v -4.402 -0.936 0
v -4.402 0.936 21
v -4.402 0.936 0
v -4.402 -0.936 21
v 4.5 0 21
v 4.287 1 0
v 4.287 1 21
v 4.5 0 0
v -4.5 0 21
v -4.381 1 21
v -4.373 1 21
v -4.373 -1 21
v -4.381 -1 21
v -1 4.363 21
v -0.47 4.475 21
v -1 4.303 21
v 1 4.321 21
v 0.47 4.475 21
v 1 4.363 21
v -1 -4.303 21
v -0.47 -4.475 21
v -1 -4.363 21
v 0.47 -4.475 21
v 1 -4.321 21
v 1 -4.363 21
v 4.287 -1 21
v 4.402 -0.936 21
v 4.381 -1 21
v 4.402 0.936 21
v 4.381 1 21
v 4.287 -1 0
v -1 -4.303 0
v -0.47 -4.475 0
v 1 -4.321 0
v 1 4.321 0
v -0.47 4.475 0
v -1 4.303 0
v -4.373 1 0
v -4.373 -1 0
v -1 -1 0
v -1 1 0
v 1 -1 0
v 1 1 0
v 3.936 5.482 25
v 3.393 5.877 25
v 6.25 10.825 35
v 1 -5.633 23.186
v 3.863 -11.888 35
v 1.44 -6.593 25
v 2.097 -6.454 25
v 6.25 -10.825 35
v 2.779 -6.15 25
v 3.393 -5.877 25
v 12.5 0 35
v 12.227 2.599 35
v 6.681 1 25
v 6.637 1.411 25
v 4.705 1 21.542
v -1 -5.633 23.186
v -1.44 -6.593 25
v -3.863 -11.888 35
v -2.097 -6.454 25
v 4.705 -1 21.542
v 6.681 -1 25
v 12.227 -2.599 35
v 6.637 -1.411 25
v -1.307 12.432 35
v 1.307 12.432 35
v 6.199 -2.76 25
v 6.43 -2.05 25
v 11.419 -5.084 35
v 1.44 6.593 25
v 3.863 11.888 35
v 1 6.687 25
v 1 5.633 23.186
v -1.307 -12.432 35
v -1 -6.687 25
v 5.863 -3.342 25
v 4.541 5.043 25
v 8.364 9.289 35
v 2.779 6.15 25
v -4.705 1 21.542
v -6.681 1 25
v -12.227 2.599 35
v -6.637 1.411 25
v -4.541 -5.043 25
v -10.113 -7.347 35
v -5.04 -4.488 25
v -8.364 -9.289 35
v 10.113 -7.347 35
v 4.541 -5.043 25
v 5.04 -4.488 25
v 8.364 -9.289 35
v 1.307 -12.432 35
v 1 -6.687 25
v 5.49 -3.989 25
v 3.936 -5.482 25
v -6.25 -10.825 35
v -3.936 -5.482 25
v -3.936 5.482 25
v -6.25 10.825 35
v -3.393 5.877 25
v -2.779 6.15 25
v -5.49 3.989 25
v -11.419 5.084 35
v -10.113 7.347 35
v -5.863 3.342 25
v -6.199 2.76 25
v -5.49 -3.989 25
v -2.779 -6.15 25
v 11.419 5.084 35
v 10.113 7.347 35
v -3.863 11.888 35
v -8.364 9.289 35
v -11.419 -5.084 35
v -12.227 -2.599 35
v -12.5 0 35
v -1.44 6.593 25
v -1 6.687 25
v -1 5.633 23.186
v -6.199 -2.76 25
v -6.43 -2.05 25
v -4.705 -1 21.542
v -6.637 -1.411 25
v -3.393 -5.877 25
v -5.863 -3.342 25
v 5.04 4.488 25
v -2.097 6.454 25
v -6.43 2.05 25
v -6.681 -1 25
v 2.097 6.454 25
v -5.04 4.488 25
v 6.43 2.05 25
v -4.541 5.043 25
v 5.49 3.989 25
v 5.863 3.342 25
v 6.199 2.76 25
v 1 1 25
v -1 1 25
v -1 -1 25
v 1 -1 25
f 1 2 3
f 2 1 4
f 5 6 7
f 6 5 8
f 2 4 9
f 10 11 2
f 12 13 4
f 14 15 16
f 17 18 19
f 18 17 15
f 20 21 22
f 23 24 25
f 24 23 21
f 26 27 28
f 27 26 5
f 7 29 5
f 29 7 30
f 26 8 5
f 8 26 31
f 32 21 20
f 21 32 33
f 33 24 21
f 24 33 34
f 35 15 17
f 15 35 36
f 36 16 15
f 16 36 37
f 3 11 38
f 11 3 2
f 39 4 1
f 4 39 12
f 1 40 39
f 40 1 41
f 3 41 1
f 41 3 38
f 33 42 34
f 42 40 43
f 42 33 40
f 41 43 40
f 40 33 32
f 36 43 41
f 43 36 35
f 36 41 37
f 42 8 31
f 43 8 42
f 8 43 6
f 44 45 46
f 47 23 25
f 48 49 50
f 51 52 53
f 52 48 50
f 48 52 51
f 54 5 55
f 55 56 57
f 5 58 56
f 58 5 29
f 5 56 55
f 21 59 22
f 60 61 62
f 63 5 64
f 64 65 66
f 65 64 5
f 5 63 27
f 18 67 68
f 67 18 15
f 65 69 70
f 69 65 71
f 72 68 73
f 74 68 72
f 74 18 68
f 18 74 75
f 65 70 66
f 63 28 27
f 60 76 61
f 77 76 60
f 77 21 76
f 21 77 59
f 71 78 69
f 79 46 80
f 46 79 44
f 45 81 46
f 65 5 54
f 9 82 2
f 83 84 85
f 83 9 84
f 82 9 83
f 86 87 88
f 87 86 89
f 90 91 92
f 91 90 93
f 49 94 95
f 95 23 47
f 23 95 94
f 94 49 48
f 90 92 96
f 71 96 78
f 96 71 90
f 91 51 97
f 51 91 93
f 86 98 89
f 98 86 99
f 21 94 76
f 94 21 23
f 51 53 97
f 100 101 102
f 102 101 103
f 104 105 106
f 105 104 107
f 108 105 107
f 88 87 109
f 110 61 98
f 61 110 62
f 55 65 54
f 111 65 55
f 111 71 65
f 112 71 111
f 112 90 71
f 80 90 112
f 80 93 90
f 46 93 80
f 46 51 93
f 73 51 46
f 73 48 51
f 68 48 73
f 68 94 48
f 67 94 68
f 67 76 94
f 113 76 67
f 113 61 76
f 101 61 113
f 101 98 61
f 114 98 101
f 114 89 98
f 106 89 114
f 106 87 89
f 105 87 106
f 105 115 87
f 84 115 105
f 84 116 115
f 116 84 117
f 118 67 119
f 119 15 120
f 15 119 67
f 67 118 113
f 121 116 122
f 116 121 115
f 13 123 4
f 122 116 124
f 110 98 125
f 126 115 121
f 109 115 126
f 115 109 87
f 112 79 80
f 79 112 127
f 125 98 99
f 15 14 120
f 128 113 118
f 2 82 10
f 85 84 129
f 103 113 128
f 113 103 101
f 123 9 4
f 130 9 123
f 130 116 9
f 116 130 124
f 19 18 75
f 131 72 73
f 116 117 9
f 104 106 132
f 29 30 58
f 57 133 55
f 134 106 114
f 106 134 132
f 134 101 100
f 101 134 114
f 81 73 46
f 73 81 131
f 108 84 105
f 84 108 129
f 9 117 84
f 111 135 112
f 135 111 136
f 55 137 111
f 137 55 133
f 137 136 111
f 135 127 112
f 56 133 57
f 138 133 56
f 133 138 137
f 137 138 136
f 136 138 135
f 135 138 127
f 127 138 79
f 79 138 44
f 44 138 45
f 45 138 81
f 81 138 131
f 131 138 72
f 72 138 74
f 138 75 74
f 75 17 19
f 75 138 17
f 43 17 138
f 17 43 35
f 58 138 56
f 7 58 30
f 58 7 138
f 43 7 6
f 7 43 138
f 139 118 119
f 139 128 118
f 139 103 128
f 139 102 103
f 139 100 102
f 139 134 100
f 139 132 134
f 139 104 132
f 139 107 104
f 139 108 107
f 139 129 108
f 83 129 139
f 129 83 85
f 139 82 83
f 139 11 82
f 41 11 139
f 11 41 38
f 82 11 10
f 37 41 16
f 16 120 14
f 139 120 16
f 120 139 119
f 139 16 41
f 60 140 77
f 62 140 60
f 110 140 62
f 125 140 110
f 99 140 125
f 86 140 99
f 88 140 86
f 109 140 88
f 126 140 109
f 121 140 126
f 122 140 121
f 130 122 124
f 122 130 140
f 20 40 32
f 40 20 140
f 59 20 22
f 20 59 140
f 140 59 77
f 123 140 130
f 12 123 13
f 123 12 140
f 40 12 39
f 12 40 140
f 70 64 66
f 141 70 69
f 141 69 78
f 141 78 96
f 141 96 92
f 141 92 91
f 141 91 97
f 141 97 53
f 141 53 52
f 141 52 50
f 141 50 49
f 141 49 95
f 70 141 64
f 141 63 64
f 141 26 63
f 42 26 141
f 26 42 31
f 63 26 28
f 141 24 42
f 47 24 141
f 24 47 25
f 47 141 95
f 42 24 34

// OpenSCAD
HoleR=5;
R=16.5;
HeadR=(R-HoleR)/2;
PipeR=HeadR+HoleR;
TotalLength=100;
ConnectLength=18;
RampLength=14;
TubeLength=TotalLength-14;
Thickness=3;
InnerR = R-Thickness;
Drop=8;
IOR=R-Drop-Thickness/2;
FN=15;

module BottomPipe() {
	linear_extrude(0.1) difference() {
		intersection() {
			square([R,R]);
			circle(R);
			polygon([[0,0], [R,0],
				[cos(30)*(R+2),sin(30)*(R+2)]]);
		}
		circle(InnerR);
	}
}

module oneSidePipe() {
		assign(Rm = R-0.5)
		hull() {
			translate([PipeR, 0, TubeLength]) sphere(HeadR, center=true, $fn=FN);
			BottomPipe();
		}
}

module Pipe() {
	oneSidePipe();
	mirror([1,-1,0]) oneSidePipe();
}

module HeadSupport() {
	rotate_extrude() translate([R-1,0,0]) rotate(90) polygon(points=[[0,0],[(HeadR+4)*1.33,0],[(HeadR+4)*1.33, (HeadR+4)]]);

}

module Head() {
	union() {
		translate([0,0,TubeLength])
		difference()
		{
			union()	{
					rotate_extrude($fn=FN) translate([PipeR, 0, 0]) circle(r = HeadR);
					translate([0,0,-(HeadR+3)*1.33-4.2]) HeadSupport();
			}
			translate([0,0,-R]) cube([R,R,2*R]);
		}
		
		Pipe();
	}
}


module TubeBody() {
	difference() {
		cylinder(r=R, TubeLength, $fn=FN);
		cylinder(r=InnerR, TubeLength, $fn=FN);
		cube([R+1, R+1, TubeLength+1]);
	}
}


module Thinner() {
	rotate_extrude($fn=FN)
	translate([IOR,0,0])
	rotate(90)
	minkowski() {
		circle(Thickness/2, $fn=FN);
		polygon(points=[[0,0], [0,-0.01],
			[ConnectLength, -0.01],
			[ConnectLength+RampLength, -Drop-0.01],
			[ConnectLength+RampLength,-Drop],
			[ConnectLength, 0]]);
	}
}


module BottomPlant() {
	difference() {
		linear_extrude(height = 3)
		difference() {
			scale ([0.8,3])	circle(r=28);
			circle(r=6);
		}
		translate([0, -60, -1]) cylinder(r=4, 6);
		translate([0, 60, -1]) cylinder(r=4, 6);
	}
}
/*
render(convexity = 2) {
	translate([0,0,ConnectLength+RampLength]) {
		Head();
		TubeBody();
	}
	difference() {
		Thinner();
		translate([0,0,-2]) cylinder(r=20, 2);
	}
	rotate(-90) BottomPlant();
	//cylinder(r=IOR-2, ConnectLength);
}
*/
//Thinner();

render(convexity = 2)
difference() {
	assign() {
		cylinder(r=IOR-2.5, ConnectLength+3);
		translate([0,0,ConnectLength + 3])
		cylinder(r1=IOR-2.5, r2=IOR-2.5+Drop, RampLength );
	}
translate([1, 1, 0])
cube([IOR+3, IOR+3, RampLength/2+ConnectLength]);
rotate(90) translate([1, 1, 0])
cube([IOR+3, IOR+3, RampLength/2+ConnectLength]);
rotate(180) translate([1, 1, 0])
cube([IOR+3, IOR+3, RampLength/2+ConnectLength]);
rotate(270) translate([1, 1, 0])
cube([IOR+3, IOR+3, RampLength/2+ConnectLength]);

}
